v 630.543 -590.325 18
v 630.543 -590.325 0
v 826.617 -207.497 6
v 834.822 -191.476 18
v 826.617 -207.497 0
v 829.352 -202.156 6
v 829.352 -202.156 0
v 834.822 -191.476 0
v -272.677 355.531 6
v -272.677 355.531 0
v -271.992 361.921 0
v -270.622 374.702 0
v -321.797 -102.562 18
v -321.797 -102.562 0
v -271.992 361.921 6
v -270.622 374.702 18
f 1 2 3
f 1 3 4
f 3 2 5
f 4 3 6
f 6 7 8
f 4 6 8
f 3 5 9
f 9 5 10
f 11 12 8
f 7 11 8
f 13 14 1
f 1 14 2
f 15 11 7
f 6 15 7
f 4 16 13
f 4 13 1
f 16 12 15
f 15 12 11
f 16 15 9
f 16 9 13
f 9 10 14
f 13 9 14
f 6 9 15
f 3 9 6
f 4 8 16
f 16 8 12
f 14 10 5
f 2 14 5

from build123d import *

# Parameters (mm, degrees)
F1_DEPTH = 18
F3_DEPTH = 6


with BuildPart() as f1:
    # F0 (on Top) → F1 (new body)
    with BuildSketch(Plane.XY):
        Polygon((834.8224465267, -191.4757991363), (-270.6217704598, 374.7018082726), (-321.7972505834, -102.5623431511), (630.5432843246, -590.3245270833), align=None)
    extrude(amount=F1_DEPTH)

    # F2 (on face) → F3 (cut)
    with BuildSketch(Plane(origin=(0, 0, 0), x_dir=(1, 0, 0), z_dir=(0, 0, -1))):
        Polygon((-271.9921794431, -361.9213306116), (829.3521314793, 202.1564195902), (826.6169739555, 207.4967298172), (-272.6773839347, -355.5310917811), align=None)
    extrude(amount=-F3_DEPTH, mode=Mode.SUBTRACT)


solid = f1.part
